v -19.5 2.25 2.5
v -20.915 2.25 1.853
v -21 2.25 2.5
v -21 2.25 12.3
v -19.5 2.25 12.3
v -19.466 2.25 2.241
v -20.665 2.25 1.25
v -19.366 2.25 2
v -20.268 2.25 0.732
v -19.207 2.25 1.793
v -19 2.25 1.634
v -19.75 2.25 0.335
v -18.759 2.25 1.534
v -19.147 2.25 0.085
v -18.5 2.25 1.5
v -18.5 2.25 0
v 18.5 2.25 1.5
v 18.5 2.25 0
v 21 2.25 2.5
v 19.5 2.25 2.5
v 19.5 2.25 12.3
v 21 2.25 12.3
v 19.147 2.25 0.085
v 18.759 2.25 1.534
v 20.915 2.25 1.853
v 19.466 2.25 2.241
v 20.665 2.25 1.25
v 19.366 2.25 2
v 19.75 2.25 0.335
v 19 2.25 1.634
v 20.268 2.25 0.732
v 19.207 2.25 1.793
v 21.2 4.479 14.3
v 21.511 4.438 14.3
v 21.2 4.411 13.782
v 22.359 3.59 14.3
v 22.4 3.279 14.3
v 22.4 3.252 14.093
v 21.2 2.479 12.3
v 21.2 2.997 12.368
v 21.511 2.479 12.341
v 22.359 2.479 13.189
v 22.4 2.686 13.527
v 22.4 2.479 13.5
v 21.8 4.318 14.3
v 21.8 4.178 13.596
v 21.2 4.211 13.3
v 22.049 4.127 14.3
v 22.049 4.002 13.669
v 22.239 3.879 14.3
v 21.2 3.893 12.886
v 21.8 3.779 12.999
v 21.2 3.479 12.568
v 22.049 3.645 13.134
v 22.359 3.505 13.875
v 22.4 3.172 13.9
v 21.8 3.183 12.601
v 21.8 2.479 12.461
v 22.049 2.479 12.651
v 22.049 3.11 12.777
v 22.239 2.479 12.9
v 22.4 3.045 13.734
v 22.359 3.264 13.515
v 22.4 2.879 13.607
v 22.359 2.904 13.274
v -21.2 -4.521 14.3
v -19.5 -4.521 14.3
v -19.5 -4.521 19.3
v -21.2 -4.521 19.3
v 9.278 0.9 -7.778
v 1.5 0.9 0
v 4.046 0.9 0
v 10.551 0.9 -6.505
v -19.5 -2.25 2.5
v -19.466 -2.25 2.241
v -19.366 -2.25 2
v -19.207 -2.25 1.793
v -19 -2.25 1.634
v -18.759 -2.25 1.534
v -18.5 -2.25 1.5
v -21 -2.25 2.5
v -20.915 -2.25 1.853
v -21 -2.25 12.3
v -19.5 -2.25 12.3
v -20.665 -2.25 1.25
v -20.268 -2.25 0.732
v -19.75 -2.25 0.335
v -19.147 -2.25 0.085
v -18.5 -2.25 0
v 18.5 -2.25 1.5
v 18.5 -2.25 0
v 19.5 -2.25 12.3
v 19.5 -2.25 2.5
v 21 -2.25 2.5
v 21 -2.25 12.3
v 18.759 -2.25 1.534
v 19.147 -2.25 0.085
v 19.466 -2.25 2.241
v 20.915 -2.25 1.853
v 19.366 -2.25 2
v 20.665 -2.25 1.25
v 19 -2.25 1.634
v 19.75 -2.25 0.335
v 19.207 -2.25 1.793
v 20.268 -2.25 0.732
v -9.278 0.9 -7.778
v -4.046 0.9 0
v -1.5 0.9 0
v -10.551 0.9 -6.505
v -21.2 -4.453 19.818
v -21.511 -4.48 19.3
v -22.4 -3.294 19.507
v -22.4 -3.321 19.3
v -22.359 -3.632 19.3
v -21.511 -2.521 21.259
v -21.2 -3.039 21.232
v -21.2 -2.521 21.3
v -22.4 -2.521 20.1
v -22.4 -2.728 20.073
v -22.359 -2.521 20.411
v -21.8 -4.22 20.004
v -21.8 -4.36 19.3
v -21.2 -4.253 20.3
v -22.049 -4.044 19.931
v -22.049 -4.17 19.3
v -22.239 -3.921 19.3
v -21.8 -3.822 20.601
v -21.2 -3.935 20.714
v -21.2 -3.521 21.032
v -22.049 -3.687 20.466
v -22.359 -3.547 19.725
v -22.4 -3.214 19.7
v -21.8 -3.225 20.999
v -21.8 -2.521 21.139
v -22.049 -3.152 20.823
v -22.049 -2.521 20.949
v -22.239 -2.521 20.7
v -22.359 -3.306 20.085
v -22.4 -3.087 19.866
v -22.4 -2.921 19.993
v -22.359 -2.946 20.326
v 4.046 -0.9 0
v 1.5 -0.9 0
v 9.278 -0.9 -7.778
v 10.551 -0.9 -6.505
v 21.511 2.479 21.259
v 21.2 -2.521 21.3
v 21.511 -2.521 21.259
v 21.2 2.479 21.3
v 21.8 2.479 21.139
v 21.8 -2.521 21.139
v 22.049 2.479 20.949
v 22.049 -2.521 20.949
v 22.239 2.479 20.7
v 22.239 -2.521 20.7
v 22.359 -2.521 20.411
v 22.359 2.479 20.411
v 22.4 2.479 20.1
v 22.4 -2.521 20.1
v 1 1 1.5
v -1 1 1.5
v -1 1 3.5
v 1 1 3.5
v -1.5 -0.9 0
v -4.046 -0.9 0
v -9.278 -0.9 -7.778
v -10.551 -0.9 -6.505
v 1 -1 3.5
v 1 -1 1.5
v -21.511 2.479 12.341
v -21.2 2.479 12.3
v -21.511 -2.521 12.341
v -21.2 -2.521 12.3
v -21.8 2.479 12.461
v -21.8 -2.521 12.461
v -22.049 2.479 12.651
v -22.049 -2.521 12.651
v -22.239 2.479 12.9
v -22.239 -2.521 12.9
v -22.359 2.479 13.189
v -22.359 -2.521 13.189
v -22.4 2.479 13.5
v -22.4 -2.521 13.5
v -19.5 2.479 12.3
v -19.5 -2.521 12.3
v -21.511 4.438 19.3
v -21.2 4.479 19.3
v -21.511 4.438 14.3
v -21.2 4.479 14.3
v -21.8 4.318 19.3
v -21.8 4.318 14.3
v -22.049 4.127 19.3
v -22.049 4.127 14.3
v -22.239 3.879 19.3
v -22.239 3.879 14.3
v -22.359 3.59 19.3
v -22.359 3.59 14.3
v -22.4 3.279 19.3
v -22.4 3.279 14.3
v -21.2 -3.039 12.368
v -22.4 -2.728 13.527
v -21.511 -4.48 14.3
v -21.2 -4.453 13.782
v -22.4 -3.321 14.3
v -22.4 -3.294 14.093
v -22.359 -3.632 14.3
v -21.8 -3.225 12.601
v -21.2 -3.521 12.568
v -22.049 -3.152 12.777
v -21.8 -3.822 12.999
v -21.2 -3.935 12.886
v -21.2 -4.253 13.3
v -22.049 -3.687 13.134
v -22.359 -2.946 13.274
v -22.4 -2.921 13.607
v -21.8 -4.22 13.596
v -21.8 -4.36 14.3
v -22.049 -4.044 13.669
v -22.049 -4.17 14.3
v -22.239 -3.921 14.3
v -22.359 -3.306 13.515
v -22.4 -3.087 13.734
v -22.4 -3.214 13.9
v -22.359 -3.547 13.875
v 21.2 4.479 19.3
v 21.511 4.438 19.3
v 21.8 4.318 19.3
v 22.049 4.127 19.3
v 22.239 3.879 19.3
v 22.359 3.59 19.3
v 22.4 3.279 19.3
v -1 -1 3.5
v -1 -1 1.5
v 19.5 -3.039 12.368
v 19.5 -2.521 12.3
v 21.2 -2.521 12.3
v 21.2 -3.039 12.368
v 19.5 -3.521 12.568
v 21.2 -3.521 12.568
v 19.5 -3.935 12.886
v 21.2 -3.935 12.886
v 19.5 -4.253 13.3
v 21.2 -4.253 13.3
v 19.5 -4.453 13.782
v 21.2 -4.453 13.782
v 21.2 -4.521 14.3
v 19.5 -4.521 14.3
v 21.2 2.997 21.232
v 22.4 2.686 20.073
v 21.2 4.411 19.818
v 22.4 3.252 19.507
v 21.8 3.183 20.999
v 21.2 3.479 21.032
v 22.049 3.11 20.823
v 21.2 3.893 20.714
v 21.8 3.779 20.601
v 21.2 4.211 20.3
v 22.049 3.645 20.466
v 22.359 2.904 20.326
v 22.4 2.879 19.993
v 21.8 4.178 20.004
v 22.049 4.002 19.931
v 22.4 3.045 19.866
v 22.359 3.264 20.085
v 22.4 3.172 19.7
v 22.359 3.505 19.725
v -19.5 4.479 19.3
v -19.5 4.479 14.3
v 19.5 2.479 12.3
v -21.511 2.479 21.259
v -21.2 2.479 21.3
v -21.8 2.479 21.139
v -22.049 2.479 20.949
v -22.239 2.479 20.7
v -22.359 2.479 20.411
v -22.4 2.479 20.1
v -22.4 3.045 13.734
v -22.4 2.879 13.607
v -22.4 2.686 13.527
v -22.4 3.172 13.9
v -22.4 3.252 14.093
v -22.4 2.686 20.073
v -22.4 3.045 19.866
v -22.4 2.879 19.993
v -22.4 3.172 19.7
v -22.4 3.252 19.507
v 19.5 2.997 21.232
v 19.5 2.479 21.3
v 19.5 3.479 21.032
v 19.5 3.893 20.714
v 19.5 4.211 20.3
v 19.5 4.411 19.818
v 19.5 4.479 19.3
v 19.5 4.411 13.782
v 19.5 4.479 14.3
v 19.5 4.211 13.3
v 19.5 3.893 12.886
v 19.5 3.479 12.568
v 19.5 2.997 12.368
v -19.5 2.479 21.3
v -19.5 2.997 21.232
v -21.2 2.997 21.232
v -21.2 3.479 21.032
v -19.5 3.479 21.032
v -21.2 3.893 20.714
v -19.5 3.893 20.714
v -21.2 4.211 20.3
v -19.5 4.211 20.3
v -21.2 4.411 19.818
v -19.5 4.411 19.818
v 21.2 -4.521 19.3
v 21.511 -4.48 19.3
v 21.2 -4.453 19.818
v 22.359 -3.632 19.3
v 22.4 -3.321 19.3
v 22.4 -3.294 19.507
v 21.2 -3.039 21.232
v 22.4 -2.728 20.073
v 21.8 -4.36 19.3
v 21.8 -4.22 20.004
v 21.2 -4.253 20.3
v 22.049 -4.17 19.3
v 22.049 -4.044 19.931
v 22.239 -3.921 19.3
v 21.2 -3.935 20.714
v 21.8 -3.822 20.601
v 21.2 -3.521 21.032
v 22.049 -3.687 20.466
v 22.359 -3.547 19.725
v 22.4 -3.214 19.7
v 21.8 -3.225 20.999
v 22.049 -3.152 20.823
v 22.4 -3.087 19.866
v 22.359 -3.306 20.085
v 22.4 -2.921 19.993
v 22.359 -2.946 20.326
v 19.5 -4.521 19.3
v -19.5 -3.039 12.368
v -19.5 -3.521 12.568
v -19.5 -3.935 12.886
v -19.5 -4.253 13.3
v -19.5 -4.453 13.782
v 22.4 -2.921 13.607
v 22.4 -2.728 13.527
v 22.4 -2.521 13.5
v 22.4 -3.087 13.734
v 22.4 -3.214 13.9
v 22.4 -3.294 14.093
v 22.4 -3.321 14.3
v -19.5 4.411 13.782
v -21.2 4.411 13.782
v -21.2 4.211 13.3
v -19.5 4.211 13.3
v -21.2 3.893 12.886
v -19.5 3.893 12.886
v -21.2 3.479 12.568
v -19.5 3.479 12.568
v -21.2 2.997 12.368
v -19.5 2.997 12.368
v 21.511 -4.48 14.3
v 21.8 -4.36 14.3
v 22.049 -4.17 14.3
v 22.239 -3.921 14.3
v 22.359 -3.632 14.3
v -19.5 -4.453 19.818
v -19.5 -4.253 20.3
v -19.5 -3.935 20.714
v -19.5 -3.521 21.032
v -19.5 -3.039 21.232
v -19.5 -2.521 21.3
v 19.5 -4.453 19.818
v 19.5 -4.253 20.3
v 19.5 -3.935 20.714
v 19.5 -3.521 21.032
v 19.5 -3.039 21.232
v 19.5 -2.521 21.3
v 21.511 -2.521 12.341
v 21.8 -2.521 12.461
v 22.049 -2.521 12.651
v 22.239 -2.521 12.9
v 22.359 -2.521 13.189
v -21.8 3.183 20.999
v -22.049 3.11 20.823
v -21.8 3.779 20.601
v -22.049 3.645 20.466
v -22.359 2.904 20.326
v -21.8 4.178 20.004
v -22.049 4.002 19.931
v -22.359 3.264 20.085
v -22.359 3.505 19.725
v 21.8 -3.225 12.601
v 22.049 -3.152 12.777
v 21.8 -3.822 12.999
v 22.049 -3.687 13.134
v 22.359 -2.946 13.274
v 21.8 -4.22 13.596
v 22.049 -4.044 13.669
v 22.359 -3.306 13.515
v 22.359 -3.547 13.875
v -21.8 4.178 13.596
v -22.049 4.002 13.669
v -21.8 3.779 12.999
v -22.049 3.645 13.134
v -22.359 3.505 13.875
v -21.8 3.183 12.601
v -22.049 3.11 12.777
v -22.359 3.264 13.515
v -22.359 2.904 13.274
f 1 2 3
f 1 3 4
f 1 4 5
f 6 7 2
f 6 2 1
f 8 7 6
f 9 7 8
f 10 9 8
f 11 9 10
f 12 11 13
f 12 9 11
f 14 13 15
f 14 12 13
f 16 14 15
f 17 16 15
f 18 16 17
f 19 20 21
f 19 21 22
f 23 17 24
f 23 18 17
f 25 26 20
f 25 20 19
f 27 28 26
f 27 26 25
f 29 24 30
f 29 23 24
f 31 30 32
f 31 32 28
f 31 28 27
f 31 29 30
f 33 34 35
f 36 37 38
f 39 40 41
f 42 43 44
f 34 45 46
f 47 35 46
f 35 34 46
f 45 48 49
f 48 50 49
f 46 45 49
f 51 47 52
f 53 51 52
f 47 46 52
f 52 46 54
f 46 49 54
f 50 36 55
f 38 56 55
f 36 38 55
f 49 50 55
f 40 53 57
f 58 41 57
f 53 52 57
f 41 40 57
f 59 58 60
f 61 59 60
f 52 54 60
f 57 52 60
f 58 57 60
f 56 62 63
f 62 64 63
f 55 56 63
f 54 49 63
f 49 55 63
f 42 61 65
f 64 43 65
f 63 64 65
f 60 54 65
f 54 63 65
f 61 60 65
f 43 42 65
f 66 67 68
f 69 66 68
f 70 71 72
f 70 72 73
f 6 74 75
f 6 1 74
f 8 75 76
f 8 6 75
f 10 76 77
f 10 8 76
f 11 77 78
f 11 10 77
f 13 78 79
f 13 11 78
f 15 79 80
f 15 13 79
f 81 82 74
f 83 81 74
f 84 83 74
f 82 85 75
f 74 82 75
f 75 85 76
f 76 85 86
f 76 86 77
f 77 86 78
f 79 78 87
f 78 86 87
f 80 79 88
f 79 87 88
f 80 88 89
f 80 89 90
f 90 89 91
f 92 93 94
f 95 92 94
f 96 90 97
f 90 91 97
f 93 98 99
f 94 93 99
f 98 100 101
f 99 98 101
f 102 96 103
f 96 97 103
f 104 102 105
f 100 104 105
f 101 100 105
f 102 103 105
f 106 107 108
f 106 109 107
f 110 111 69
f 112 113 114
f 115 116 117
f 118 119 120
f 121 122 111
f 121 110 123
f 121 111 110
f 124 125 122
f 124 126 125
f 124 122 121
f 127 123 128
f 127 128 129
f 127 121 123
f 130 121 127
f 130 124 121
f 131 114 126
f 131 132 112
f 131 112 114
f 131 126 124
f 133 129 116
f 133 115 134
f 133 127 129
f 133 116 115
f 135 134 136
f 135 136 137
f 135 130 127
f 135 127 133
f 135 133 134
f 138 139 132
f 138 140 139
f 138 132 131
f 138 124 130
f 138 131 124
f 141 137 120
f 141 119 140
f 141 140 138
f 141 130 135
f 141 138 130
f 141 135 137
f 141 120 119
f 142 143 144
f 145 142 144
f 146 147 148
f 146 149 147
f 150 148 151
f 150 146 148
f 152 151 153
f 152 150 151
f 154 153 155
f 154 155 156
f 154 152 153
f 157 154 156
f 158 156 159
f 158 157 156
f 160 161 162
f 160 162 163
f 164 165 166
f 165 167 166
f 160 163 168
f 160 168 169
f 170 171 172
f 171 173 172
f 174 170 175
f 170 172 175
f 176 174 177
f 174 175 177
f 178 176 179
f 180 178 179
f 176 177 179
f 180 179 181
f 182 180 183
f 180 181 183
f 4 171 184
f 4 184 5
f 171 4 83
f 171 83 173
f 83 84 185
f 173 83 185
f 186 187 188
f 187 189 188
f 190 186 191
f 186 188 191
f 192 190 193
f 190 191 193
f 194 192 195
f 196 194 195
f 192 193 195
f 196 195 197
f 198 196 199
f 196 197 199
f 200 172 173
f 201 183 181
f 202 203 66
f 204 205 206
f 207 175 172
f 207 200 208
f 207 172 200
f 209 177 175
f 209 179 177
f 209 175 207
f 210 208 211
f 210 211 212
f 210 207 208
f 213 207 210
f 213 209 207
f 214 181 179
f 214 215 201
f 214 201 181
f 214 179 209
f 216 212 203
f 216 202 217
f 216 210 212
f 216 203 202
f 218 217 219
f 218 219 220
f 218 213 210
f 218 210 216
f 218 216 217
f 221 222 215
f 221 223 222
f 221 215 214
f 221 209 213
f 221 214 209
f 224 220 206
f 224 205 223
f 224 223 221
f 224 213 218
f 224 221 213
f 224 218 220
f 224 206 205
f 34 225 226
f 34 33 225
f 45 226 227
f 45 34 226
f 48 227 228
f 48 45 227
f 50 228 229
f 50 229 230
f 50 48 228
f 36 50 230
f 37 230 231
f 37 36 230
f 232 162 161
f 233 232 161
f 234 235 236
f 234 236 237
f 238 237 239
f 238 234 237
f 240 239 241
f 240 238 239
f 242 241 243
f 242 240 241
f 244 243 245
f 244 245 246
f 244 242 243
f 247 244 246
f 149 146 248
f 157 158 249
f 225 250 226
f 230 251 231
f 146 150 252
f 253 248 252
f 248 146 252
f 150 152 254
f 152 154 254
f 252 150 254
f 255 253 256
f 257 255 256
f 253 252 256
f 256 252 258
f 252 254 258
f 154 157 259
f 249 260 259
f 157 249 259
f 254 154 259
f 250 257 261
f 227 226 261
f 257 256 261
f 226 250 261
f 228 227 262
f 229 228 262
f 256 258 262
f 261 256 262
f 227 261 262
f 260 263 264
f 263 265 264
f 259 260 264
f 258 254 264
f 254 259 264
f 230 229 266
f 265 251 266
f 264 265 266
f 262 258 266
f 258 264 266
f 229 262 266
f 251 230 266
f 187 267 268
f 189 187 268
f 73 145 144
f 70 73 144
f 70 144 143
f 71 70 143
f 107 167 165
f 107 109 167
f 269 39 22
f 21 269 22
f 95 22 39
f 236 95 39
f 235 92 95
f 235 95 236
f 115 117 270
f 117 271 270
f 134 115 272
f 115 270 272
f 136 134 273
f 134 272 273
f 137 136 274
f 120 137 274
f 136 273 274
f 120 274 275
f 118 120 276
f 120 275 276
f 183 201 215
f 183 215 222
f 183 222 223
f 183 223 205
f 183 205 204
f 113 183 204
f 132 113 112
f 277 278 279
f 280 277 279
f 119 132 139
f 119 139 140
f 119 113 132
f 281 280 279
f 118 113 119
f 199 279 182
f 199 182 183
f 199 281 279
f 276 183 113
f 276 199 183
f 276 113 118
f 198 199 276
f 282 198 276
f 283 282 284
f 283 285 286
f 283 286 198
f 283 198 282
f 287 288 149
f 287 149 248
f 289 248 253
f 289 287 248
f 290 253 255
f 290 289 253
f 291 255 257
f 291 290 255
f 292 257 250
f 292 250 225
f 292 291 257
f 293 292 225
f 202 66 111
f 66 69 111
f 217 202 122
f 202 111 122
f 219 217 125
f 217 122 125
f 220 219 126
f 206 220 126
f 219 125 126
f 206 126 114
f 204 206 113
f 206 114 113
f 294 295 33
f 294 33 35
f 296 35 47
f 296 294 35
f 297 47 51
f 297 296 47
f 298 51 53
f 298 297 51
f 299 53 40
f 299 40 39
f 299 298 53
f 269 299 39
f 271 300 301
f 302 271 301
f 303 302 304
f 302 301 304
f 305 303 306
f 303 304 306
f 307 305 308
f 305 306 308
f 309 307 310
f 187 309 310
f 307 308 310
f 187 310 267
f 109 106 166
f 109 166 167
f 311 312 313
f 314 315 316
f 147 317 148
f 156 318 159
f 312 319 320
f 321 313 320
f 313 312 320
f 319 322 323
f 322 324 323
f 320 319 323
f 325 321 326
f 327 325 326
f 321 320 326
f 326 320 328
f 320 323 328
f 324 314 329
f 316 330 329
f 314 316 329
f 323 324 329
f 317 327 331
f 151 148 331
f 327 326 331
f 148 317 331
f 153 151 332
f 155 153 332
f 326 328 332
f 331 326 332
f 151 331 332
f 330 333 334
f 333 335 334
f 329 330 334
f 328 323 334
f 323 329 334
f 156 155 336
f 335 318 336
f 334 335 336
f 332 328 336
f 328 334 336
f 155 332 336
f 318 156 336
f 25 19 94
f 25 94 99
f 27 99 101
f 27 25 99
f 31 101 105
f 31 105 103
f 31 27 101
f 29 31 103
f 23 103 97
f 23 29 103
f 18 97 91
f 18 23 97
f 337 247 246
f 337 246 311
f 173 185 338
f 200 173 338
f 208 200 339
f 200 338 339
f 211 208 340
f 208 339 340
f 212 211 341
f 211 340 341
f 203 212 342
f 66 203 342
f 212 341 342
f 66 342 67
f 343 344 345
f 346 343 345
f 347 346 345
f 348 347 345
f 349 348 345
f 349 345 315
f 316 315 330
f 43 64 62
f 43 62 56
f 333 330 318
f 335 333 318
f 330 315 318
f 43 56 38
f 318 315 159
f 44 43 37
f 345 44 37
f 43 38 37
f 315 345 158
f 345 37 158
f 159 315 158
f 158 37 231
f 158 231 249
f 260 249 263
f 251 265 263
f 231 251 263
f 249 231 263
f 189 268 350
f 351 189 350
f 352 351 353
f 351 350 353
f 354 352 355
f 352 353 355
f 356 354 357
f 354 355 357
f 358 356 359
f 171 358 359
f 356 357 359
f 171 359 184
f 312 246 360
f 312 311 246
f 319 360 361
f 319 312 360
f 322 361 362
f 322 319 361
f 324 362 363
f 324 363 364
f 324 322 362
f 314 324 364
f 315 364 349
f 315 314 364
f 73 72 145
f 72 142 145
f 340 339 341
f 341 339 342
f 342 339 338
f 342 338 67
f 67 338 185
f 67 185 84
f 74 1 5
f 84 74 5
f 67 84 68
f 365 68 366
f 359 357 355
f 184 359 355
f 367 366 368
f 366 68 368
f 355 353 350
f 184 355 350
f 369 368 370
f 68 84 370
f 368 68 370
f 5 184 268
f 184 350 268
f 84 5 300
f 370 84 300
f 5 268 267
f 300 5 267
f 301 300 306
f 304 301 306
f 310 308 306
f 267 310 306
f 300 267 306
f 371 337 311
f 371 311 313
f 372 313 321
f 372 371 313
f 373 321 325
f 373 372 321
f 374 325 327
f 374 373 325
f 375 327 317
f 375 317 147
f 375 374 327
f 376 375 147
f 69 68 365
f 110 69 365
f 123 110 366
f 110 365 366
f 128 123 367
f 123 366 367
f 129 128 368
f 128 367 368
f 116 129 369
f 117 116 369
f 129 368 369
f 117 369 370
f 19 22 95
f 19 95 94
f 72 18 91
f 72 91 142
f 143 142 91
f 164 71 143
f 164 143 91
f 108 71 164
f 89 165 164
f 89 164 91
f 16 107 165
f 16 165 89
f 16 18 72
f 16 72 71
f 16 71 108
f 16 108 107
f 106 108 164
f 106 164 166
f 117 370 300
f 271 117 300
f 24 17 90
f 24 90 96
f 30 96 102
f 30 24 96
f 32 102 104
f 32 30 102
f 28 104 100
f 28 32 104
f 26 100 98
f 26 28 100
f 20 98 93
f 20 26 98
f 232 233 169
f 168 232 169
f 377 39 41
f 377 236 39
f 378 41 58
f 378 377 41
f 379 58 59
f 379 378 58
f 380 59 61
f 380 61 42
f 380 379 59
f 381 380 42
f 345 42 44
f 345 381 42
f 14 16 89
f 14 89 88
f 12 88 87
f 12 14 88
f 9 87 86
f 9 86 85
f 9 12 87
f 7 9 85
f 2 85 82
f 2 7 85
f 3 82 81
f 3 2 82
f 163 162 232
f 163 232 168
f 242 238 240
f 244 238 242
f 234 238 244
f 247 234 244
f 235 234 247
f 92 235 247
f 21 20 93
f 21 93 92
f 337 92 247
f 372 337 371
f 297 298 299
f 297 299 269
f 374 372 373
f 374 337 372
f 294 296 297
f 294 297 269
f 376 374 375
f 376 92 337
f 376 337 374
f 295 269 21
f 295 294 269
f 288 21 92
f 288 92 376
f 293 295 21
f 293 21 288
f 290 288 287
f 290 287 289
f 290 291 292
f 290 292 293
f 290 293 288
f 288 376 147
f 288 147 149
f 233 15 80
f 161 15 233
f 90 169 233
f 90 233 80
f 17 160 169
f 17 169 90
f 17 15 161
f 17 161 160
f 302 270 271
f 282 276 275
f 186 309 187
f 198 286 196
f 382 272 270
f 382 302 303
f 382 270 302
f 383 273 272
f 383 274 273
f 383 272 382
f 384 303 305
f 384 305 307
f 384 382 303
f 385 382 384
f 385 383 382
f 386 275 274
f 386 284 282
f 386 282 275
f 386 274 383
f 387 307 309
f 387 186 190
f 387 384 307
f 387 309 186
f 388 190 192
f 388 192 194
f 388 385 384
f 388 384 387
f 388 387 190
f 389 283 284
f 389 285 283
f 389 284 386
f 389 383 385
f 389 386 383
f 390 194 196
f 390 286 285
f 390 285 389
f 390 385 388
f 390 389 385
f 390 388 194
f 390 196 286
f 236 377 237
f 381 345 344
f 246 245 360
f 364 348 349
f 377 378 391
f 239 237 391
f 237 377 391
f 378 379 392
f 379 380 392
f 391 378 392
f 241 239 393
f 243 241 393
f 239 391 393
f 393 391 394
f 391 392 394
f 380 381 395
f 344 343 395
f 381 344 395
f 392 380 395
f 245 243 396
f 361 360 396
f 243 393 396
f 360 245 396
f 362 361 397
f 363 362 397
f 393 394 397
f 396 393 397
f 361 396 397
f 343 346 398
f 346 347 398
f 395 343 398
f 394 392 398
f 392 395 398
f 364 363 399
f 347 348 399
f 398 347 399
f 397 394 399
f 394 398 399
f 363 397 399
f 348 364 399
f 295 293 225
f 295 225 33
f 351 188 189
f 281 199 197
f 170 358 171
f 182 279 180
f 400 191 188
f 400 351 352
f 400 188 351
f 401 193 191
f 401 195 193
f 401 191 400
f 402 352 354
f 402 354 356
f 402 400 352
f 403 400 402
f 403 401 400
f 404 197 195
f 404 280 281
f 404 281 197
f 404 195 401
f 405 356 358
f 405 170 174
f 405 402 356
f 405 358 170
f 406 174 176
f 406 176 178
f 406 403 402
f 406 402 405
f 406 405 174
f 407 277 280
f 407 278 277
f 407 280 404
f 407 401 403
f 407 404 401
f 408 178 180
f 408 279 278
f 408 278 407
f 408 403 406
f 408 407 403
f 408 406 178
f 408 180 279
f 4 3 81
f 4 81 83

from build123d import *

# Parameters (mm, degrees)
EXTRUDE_2_DEPTH        = 2.25
SKETCH_1_5_W           = 2
SKETCH_1_5_H           = 2
EXTRUDE_3_DEPTH        = 1
EXTRUDE_4_DEPTH        = 0.9
EXTRUDE_5_DEPTH        = 2.9
FILLET_1_R             = 1.2
FILLET_1_OF_MIRROR_2_R = 1.2


with BuildPart() as part:
    # 草图1 → 凸台-拉伸2 (new, symmetric)
    with BuildSketch(Plane(origin=(0, 0, 0), x_dir=(1, 0, 0), z_dir=(0, 1, 0))):
        with BuildLine():
            Line((-18.5, -1.5), (18.5, -1.5))
            ThreePointArc((18.5, -1.5), (19.207106781, -1.792893219), (19.5, -2.5))
            Line((19.5, -2.5), (19.5, -12.3))
            Line((19.5, -12.3), (21, -12.3))
            Line((21, -12.3), (21, -2.5))
            ThreePointArc((21, -2.5), (20.267766953, -0.732233047), (18.5, 0))
            Line((18.5, 0), (-18.5, 0))
            ThreePointArc((-18.5, 0), (-20.267766953, -0.732233047), (-21, -2.5))
            Line((-21, -2.5), (-21, -12.3))
            Line((-21, -12.3), (-19.5, -12.3))
            Line((-19.5, -12.3), (-19.5, -2.5))
            ThreePointArc((-19.5, -2.5), (-19.207106781, -1.792893219), (-18.5, -1.5))
        make_face()
    extrude(amount=EXTRUDE_2_DEPTH, both=True)

    # 草图1<5> → 凸台-拉伸3 (add, symmetric)
    with BuildSketch(Plane(origin=(0, 0, 0), x_dir=(1, 0, 0), z_dir=(0, 1, 0))):
        with Locations((0, -2.5)):
            Rectangle(SKETCH_1_5_W, SKETCH_1_5_H)
    extrude(amount=EXTRUDE_3_DEPTH, both=True)

    # 草图1<6> → 凸台-拉伸4 (add, symmetric)
    with BuildSketch(Plane(origin=(0, 0, 0), x_dir=(1, 0, 0), z_dir=(0, 1, 0))):
        Polygon((9.278174593, 7.778174593), (1.5, 0), (4.045584412, 0), (10.550966799, 6.505382387), align=None)
        Polygon((-4.045584412, 0), (-1.5, 0), (-9.278174593, 7.778174593), (-10.550966799, 6.505382387), align=None)
    extrude(amount=EXTRUDE_4_DEPTH, both=True)

    # 草图2 → 凸台-拉伸5 (add)
    with BuildSketch(Plane.ZY.offset(-19.5)):
        with BuildLine():
            Line((19.3, 4.478921871), (14.3, 4.478921871))
            ThreePointArc((14.3, 4.478921871), (12.885786438, 3.893135433), (12.3, 2.478921871))
            Line((12.3, 2.478921871), (12.3, -2.521078129))
            ThreePointArc((12.3, -2.521078129), (12.885786438, -3.935291691), (14.3, -4.521078129))
            Line((14.3, -4.521078129), (19.3, -4.521078129))
            ThreePointArc((19.3, -4.521078129), (20.714213562, -3.935291691), (21.3, -2.521078129))
            Line((21.3, -2.521078129), (21.3, 2.478921871))
            ThreePointArc((21.3, 2.478921871), (20.714213562, 3.893135433), (19.3, 4.478921871))
        make_face()
    extrude_5 = extrude(amount=-EXTRUDE_5_DEPTH)

    # 圆角1
    fillet_1_edges = [part.edges().sort_by_distance(p)[0] for p in [
        (22.4, 3.893135433, 12.885786438),
        (22.4, 4.478921871, 16.8),
        (22.4, 3.893135433, 20.714213562),
        (22.4, -0.021078129, 21.3),
        (22.4, -3.935291691, 20.714213562),
        (22.4, -4.521078129, 16.8),
        (22.4, -3.935291691, 12.885786438),
        (22.4, -0.021078129, 12.3),
    ]]
    fillet(fillet_1_edges, radius=FILLET_1_R)

    # 镜向2: 凸台-拉伸5 across plane
    add(extrude_5.mirror(Plane(origin=(0, 0, 0), x_dir=(0, 0, 1), z_dir=(1, 0, 0))))

    # 圆角1 of 镜向2
    fillet_1_of_mirror_2_edges = [part.edges().sort_by_distance(p)[0] for p in [
        (-22.4, 3.893135433, 12.885786438),
        (-22.4, 4.478921871, 16.8),
        (-22.4, 3.893135433, 20.714213562),
        (-22.4, -0.021078129, 21.3),
        (-22.4, -3.935291691, 20.714213562),
        (-22.4, -4.521078129, 16.8),
        (-22.4, -3.935291691, 12.885786438),
        (-22.4, -0.021078129, 12.3),
    ]]
    fillet(fillet_1_of_mirror_2_edges, radius=FILLET_1_OF_MIRROR_2_R)


solid = part.part
